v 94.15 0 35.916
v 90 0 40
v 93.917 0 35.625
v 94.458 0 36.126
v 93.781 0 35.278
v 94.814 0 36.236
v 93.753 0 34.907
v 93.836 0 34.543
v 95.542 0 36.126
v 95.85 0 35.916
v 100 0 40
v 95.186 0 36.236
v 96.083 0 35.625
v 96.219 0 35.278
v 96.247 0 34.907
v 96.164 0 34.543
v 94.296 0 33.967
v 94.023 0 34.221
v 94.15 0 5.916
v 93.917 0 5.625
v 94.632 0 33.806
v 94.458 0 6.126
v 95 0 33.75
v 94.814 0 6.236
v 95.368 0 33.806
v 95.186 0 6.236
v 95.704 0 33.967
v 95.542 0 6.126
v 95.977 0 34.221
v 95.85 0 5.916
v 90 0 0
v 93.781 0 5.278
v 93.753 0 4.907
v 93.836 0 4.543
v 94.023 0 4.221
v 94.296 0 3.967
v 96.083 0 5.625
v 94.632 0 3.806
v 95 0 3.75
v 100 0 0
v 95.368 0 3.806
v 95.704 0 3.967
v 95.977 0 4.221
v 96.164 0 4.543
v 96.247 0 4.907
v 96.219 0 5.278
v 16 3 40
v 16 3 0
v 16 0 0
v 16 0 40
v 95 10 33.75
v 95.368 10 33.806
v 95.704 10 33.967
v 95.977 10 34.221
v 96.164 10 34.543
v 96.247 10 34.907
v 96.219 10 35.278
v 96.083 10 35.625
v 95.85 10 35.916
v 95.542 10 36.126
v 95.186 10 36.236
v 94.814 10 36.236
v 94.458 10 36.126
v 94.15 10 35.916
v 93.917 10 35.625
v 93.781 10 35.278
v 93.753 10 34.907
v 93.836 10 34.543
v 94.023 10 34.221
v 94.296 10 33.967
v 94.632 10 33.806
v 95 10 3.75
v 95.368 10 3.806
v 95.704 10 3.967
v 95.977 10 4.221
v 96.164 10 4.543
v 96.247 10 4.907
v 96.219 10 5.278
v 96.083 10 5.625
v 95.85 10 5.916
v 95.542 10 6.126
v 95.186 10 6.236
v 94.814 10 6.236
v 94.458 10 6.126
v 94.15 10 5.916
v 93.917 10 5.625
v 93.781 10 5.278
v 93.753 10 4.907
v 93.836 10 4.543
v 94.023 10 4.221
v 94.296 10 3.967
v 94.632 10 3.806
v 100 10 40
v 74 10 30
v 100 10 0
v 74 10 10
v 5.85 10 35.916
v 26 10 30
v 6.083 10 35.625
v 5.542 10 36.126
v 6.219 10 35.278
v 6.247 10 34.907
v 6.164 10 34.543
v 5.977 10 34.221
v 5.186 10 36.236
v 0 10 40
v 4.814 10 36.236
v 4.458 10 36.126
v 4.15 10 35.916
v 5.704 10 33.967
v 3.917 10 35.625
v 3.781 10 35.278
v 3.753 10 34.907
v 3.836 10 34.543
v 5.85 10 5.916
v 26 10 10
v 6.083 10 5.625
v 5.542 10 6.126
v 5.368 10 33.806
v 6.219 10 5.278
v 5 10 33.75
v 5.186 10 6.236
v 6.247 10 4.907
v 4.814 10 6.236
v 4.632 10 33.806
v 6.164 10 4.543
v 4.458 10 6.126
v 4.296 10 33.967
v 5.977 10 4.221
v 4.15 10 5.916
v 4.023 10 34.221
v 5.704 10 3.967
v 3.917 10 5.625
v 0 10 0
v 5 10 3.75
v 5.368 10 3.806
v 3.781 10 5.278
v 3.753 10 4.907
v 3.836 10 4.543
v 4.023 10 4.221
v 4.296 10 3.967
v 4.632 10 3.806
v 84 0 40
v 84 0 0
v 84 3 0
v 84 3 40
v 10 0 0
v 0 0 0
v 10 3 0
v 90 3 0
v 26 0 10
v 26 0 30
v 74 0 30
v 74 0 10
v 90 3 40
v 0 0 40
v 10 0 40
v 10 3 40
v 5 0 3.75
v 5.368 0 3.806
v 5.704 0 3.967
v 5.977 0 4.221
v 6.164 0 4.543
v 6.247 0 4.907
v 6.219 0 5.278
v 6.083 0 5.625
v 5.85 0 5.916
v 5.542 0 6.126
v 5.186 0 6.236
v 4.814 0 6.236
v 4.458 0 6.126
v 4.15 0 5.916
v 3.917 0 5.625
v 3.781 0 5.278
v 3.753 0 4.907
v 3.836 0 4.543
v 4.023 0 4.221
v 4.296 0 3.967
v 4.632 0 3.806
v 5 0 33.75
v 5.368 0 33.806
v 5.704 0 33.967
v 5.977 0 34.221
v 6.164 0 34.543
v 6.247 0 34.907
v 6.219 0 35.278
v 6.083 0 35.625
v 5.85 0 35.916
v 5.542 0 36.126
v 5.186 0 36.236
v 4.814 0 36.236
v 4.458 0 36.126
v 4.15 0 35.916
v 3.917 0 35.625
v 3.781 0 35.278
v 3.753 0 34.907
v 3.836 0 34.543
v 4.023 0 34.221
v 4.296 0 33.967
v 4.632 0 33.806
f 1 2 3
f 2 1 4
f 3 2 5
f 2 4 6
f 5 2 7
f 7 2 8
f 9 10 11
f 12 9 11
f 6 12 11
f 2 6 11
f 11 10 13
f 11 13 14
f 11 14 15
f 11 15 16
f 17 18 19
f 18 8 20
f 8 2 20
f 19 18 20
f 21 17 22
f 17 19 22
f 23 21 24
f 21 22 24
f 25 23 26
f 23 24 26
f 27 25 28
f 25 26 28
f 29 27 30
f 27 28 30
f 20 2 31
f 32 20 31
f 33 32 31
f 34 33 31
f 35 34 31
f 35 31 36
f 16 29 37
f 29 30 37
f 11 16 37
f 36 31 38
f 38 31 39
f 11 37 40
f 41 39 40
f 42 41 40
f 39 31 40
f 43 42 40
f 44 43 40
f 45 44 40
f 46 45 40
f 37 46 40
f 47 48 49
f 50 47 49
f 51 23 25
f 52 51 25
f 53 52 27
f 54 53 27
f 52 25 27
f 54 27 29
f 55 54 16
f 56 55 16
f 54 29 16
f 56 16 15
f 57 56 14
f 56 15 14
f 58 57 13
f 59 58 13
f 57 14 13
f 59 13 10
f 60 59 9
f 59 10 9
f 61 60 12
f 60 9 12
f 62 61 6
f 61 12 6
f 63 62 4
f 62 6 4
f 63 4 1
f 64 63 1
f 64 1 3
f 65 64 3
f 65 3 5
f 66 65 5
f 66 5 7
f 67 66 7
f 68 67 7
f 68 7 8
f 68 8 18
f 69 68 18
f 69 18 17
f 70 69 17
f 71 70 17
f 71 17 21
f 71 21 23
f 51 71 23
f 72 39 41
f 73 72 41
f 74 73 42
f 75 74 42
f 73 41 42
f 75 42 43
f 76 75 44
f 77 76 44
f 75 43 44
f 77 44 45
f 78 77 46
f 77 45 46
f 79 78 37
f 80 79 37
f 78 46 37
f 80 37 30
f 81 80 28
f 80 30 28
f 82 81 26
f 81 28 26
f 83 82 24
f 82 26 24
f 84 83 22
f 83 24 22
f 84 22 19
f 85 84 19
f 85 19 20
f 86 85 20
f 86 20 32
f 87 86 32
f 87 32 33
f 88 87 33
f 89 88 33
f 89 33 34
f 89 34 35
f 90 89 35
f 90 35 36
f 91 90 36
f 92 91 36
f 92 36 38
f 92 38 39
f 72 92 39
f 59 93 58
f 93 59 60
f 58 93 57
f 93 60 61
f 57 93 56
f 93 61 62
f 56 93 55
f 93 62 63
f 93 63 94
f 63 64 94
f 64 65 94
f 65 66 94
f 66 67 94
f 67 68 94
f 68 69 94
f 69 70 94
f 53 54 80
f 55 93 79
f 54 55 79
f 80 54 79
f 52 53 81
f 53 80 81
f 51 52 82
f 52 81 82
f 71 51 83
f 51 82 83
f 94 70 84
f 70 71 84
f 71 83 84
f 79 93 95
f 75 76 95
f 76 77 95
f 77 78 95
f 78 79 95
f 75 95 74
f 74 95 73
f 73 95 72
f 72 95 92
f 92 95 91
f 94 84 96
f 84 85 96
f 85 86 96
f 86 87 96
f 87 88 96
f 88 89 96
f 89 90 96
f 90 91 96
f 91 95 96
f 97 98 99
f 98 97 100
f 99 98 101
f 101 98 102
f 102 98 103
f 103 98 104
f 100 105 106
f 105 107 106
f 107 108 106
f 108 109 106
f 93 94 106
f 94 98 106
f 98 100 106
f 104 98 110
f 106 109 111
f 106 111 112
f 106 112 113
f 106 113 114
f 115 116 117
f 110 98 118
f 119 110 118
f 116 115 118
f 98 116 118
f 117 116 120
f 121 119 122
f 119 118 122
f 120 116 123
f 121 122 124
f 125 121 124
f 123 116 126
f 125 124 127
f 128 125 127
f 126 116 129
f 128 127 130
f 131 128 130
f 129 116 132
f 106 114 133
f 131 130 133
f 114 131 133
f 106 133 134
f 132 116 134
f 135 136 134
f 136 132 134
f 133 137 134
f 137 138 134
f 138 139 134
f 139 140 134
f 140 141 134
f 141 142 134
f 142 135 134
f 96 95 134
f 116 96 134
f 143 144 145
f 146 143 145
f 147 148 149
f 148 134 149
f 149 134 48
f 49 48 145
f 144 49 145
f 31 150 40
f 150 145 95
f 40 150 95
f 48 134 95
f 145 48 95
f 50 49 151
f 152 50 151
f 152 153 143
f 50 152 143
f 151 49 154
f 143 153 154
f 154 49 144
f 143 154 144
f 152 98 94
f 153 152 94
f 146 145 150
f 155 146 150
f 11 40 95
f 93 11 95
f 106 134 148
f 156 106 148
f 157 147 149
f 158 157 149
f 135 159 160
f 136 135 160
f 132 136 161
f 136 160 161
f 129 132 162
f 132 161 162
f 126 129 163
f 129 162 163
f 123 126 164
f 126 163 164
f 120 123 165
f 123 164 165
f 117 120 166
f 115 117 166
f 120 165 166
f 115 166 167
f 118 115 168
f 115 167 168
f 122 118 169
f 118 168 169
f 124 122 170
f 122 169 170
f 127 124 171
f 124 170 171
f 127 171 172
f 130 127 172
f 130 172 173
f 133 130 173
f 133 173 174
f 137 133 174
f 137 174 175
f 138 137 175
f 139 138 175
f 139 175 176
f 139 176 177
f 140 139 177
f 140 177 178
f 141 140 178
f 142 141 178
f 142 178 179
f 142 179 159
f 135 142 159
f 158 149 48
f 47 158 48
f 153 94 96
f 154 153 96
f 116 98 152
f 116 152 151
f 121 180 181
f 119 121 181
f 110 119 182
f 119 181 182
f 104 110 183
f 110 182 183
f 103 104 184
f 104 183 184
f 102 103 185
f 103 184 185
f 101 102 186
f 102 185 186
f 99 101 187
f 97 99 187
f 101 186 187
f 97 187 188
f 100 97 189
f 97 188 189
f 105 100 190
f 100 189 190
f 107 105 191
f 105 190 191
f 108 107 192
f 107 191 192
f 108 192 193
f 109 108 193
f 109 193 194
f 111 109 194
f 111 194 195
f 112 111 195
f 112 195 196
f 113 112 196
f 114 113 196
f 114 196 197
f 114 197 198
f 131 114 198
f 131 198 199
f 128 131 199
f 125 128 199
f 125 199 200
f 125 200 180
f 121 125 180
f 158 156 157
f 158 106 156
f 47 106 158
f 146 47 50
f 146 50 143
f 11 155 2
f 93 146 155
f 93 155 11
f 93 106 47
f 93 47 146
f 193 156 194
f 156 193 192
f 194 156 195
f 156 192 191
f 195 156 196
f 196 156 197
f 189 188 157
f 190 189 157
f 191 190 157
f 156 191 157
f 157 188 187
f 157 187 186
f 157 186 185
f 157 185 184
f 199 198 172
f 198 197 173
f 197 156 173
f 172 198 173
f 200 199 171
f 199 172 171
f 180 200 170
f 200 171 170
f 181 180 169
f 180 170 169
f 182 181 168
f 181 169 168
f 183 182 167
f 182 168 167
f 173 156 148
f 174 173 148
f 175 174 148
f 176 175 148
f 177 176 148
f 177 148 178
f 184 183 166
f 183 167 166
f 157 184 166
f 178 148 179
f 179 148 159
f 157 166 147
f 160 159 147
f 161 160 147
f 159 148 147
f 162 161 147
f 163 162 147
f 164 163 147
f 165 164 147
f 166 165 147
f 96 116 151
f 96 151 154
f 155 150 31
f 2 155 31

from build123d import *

# Parameters (mm, degrees)
BOSS_EXTRU_1_DEPTH      = 40
ENL_V_MAT_EXTRU_1_REACH = 110.167
ESQUISSE2_W             = 48
ESQUISSE2_H             = 20
ENL_V_MAT_EXTRU_2_REACH = 110.167
ESQUISSE3_R             = 1.25


with BuildPart() as part:
    # Esquisse1 → Boss.-Extru.1 (new body)
    with BuildSketch(Plane.XY):
        Polygon((0, 0), (10, 0), (10, 3), (16, 3), (16, 0), (84, 0), (84, 3), (90, 3), (90, 0), (100, 0), (100, 10), (0, 10), align=None)
    extrude(amount=BOSS_EXTRU_1_DEPTH)

    # Esquisse2 → Enlèv. mat.-Extru.1 (cut, up to next)
    with BuildSketch(Plane(origin=(0, 10, 0), x_dir=(1, 0, 0), z_dir=(0, 1, 0)), mode=Mode.PRIVATE) as enl_v_mat_extru_1_sk1:
        with Locations((50, -20)):
            Rectangle(ESQUISSE2_W, ESQUISSE2_H)
    enl_v_mat_extru_1_tool1 = extrude(enl_v_mat_extru_1_sk1.sketch, amount=-ENL_V_MAT_EXTRU_1_REACH, mode=Mode.PRIVATE) & part.part
    add(enl_v_mat_extru_1_tool1.solids().sort_by_distance((50, 10, 20))[0], mode=Mode.SUBTRACT)

    # Esquisse3 → Enlèv. mat.-Extru.2 (cut, up to next)
    with BuildSketch(Plane.XZ, mode=Mode.PRIVATE) as enl_v_mat_extru_2_sk1:
        with Locations(Location((5, 35, 0), (0, 0, 270))):
            Circle(ESQUISSE3_R)
    enl_v_mat_extru_2_tool1 = extrude(enl_v_mat_extru_2_sk1.sketch, amount=-ENL_V_MAT_EXTRU_2_REACH, mode=Mode.PRIVATE) & part.part
    # Esquisse3 → Enlèv. mat.-Extru.2 (cut, up to next)
    with BuildSketch(Plane.XZ, mode=Mode.PRIVATE) as enl_v_mat_extru_2_sk2:
        with Locations(Location((5, 5, 0), (0, 0, 270))):
            Circle(ESQUISSE3_R)
    enl_v_mat_extru_2_tool2 = extrude(enl_v_mat_extru_2_sk2.sketch, amount=-ENL_V_MAT_EXTRU_2_REACH, mode=Mode.PRIVATE) & part.part
    # Esquisse3 → Enlèv. mat.-Extru.2 (cut, up to next)
    with BuildSketch(Plane.XZ, mode=Mode.PRIVATE) as enl_v_mat_extru_2_sk3:
        with Locations(Location((95, 35, 0), (0, 0, 270))):
            Circle(ESQUISSE3_R)
    enl_v_mat_extru_2_tool3 = extrude(enl_v_mat_extru_2_sk3.sketch, amount=-ENL_V_MAT_EXTRU_2_REACH, mode=Mode.PRIVATE) & part.part
    # Esquisse3 → Enlèv. mat.-Extru.2 (cut, up to next)
    with BuildSketch(Plane.XZ, mode=Mode.PRIVATE) as enl_v_mat_extru_2_sk4:
        with Locations(Location((95, 5, 0), (0, 0, 270))):
            Circle(ESQUISSE3_R)
    enl_v_mat_extru_2_tool4 = extrude(enl_v_mat_extru_2_sk4.sketch, amount=-ENL_V_MAT_EXTRU_2_REACH, mode=Mode.PRIVATE) & part.part
    add(enl_v_mat_extru_2_tool1.solids().sort_by_distance((5, 0, 35))[0], mode=Mode.SUBTRACT)
    add(enl_v_mat_extru_2_tool2.solids().sort_by_distance((5, 0, 5))[0], mode=Mode.SUBTRACT)
    add(enl_v_mat_extru_2_tool3.solids().sort_by_distance((95, 0, 35))[0], mode=Mode.SUBTRACT)
    add(enl_v_mat_extru_2_tool4.solids().sort_by_distance((95, 0, 5))[0], mode=Mode.SUBTRACT)


solid = part.part
